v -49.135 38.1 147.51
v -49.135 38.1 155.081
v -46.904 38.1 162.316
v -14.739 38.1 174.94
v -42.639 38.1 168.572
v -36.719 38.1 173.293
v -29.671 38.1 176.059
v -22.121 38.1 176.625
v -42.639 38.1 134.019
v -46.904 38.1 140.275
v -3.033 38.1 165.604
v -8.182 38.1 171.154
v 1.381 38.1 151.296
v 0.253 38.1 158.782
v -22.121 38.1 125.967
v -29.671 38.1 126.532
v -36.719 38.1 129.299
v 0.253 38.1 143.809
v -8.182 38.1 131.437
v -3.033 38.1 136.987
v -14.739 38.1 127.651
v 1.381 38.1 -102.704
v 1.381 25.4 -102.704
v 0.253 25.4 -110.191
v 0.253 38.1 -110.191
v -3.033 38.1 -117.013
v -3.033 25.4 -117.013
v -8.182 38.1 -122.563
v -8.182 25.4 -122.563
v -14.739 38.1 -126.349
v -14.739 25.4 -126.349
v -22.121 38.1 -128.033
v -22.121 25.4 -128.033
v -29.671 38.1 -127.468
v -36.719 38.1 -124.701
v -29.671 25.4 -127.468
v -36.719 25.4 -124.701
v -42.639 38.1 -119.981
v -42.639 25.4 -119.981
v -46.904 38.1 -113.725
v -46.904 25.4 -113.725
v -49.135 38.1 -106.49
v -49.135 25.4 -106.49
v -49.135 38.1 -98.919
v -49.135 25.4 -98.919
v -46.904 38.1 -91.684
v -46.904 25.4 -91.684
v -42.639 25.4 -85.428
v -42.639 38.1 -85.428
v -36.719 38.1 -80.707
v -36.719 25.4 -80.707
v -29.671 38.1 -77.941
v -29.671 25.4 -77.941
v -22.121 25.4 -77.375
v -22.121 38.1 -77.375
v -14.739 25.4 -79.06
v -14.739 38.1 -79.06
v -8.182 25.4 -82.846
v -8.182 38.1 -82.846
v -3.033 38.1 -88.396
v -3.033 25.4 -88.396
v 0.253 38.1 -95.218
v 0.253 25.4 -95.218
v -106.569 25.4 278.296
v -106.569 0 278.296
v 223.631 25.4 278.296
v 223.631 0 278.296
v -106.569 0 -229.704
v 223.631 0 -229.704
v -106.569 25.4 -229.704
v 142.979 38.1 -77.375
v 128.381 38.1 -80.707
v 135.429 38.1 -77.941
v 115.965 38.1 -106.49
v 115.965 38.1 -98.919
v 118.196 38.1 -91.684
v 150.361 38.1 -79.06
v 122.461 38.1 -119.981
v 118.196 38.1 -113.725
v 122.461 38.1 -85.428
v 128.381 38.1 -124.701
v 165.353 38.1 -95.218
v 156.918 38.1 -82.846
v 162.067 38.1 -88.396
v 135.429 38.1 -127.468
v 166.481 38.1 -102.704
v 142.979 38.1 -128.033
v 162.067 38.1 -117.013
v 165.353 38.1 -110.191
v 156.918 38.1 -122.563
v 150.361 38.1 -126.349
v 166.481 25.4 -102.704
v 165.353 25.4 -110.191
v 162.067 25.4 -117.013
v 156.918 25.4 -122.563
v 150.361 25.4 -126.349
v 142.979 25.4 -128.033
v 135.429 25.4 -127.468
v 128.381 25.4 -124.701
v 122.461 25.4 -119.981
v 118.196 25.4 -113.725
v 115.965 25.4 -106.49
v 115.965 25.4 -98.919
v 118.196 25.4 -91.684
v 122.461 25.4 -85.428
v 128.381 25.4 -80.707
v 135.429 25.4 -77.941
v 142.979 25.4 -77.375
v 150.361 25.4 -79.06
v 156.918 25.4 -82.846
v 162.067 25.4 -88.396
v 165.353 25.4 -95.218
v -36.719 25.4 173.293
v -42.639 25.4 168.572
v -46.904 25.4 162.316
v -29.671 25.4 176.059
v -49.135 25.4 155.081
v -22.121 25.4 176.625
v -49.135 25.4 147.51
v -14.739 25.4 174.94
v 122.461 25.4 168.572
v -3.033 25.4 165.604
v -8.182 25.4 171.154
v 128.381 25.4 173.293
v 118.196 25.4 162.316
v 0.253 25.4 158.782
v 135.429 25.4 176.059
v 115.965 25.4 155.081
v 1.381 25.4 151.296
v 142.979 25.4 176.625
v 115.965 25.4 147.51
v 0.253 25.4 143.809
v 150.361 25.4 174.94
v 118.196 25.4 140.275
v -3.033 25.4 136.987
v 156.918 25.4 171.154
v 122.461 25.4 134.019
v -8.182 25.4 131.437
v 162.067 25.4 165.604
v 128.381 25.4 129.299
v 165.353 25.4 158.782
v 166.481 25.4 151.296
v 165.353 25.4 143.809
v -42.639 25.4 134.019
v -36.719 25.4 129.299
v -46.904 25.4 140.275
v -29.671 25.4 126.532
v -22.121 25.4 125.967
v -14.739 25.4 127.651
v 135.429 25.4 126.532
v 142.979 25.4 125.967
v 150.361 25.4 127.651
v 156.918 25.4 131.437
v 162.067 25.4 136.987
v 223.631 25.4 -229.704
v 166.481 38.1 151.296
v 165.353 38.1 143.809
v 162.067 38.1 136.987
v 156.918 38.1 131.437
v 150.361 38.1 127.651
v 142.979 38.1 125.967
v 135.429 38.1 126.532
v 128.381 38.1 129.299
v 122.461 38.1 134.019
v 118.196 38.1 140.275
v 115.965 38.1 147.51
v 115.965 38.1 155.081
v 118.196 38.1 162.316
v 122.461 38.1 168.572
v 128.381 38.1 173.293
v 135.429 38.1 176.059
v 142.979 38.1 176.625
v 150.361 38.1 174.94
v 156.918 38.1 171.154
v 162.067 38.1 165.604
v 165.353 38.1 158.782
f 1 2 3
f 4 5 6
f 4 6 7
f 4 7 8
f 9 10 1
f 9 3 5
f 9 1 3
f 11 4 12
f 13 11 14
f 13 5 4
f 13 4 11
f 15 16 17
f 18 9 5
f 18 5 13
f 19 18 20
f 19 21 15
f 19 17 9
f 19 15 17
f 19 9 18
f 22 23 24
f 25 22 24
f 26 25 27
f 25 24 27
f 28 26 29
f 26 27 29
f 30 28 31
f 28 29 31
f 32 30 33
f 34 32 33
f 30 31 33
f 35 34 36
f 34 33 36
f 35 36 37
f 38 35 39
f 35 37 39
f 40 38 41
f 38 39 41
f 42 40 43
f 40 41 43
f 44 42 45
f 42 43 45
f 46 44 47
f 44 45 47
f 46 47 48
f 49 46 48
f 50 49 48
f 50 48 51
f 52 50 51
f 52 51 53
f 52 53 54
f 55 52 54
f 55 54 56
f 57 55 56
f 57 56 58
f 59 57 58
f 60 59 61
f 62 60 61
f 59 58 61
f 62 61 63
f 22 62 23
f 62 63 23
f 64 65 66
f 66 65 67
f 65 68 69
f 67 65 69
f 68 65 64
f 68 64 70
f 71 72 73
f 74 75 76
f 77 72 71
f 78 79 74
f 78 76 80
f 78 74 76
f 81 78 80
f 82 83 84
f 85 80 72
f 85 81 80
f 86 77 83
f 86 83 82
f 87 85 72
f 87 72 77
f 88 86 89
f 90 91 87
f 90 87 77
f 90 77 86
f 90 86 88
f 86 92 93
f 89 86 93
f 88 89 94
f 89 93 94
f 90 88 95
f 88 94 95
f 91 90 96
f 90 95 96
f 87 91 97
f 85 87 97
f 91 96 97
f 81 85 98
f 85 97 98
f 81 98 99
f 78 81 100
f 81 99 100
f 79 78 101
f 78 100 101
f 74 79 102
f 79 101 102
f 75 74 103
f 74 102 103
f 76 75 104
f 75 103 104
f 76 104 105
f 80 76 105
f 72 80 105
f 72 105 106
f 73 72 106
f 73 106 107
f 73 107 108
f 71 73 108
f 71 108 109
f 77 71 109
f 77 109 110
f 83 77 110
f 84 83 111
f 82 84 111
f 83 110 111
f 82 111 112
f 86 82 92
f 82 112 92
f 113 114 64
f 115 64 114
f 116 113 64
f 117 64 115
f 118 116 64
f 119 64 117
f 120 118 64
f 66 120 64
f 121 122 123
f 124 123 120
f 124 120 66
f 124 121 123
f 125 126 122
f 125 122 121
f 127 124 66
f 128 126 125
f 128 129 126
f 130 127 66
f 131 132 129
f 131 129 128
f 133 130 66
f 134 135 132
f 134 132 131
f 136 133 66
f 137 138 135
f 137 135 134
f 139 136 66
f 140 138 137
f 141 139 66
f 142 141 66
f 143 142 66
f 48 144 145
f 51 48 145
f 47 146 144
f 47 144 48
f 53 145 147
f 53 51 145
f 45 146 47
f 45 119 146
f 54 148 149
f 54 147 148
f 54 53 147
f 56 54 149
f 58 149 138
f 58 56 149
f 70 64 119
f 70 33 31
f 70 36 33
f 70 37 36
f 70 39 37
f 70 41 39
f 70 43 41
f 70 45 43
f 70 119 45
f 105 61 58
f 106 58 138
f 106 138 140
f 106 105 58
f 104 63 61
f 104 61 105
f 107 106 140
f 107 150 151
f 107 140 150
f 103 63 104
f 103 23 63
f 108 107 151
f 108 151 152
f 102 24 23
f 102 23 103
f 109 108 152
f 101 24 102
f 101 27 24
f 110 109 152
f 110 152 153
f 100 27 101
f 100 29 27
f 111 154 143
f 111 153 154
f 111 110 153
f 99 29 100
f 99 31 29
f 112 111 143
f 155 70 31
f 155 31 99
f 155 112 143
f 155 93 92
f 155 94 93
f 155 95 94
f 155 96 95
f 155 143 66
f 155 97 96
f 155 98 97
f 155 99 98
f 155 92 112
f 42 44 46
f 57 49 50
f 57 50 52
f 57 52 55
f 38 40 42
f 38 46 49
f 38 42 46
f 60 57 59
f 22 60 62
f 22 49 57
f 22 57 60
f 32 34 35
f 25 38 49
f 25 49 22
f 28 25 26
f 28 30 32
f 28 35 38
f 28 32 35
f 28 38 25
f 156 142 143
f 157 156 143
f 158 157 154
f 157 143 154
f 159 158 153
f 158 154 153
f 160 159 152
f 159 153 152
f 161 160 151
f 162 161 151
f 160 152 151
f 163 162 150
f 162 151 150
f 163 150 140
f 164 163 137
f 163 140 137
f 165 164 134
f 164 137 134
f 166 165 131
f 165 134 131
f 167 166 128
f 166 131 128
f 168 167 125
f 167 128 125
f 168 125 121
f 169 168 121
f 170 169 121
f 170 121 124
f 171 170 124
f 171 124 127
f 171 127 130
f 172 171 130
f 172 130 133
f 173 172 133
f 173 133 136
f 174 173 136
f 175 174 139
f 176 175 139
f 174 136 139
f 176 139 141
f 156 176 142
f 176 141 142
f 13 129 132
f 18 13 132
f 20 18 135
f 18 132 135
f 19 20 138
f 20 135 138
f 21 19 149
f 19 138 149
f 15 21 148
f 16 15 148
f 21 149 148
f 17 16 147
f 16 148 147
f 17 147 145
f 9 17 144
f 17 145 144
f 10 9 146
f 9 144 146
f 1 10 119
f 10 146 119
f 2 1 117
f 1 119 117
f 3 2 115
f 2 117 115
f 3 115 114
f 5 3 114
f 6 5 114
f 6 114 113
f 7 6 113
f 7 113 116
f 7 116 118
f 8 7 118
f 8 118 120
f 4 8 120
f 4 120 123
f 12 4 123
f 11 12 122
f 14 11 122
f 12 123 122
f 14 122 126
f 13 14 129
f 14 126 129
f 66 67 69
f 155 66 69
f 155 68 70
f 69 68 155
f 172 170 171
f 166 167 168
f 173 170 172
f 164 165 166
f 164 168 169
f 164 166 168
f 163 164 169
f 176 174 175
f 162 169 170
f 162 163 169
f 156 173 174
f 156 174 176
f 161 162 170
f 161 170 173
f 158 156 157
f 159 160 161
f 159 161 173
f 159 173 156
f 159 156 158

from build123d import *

# Parameters (mm, degrees)
SKETCH1_W           = 330.2
SKETCH1_H           = 508
BOSS_EXTRUDE1_DEPTH = 25.4
SKETCH2_R           = 25.4
BOSS_EXTRUDE2_DEPTH = 12.7


with BuildPart() as part:
    # Sketch1 → Boss-Extrude1 (new body)
    with BuildSketch(Plane(origin=(0, 0, 0), x_dir=(1, 0, 0), z_dir=(0, 1, 0))):
        with Locations((58.531016631, -24.295652174)):
            Rectangle(SKETCH1_W, SKETCH1_H)
    extrude(amount=BOSS_EXTRUDE1_DEPTH)

    # Sketch2 → Boss-Extrude2 (add)
    with BuildSketch(Plane(origin=(0, 25.4, 0), x_dir=(1, 0, 0), z_dir=(0, 1, 0))):
        with Locations((-24.018983369, 102.704347826)):
            Circle(SKETCH2_R)
        with Locations((141.081016631, 102.704347826)):
            Circle(SKETCH2_R)
        with Locations((141.081016631, -151.295652174)):
            Circle(SKETCH2_R)
        with Locations((-24.018983369, -151.295652174)):
            Circle(SKETCH2_R)
    extrude(amount=BOSS_EXTRUDE2_DEPTH)


solid = part.part
